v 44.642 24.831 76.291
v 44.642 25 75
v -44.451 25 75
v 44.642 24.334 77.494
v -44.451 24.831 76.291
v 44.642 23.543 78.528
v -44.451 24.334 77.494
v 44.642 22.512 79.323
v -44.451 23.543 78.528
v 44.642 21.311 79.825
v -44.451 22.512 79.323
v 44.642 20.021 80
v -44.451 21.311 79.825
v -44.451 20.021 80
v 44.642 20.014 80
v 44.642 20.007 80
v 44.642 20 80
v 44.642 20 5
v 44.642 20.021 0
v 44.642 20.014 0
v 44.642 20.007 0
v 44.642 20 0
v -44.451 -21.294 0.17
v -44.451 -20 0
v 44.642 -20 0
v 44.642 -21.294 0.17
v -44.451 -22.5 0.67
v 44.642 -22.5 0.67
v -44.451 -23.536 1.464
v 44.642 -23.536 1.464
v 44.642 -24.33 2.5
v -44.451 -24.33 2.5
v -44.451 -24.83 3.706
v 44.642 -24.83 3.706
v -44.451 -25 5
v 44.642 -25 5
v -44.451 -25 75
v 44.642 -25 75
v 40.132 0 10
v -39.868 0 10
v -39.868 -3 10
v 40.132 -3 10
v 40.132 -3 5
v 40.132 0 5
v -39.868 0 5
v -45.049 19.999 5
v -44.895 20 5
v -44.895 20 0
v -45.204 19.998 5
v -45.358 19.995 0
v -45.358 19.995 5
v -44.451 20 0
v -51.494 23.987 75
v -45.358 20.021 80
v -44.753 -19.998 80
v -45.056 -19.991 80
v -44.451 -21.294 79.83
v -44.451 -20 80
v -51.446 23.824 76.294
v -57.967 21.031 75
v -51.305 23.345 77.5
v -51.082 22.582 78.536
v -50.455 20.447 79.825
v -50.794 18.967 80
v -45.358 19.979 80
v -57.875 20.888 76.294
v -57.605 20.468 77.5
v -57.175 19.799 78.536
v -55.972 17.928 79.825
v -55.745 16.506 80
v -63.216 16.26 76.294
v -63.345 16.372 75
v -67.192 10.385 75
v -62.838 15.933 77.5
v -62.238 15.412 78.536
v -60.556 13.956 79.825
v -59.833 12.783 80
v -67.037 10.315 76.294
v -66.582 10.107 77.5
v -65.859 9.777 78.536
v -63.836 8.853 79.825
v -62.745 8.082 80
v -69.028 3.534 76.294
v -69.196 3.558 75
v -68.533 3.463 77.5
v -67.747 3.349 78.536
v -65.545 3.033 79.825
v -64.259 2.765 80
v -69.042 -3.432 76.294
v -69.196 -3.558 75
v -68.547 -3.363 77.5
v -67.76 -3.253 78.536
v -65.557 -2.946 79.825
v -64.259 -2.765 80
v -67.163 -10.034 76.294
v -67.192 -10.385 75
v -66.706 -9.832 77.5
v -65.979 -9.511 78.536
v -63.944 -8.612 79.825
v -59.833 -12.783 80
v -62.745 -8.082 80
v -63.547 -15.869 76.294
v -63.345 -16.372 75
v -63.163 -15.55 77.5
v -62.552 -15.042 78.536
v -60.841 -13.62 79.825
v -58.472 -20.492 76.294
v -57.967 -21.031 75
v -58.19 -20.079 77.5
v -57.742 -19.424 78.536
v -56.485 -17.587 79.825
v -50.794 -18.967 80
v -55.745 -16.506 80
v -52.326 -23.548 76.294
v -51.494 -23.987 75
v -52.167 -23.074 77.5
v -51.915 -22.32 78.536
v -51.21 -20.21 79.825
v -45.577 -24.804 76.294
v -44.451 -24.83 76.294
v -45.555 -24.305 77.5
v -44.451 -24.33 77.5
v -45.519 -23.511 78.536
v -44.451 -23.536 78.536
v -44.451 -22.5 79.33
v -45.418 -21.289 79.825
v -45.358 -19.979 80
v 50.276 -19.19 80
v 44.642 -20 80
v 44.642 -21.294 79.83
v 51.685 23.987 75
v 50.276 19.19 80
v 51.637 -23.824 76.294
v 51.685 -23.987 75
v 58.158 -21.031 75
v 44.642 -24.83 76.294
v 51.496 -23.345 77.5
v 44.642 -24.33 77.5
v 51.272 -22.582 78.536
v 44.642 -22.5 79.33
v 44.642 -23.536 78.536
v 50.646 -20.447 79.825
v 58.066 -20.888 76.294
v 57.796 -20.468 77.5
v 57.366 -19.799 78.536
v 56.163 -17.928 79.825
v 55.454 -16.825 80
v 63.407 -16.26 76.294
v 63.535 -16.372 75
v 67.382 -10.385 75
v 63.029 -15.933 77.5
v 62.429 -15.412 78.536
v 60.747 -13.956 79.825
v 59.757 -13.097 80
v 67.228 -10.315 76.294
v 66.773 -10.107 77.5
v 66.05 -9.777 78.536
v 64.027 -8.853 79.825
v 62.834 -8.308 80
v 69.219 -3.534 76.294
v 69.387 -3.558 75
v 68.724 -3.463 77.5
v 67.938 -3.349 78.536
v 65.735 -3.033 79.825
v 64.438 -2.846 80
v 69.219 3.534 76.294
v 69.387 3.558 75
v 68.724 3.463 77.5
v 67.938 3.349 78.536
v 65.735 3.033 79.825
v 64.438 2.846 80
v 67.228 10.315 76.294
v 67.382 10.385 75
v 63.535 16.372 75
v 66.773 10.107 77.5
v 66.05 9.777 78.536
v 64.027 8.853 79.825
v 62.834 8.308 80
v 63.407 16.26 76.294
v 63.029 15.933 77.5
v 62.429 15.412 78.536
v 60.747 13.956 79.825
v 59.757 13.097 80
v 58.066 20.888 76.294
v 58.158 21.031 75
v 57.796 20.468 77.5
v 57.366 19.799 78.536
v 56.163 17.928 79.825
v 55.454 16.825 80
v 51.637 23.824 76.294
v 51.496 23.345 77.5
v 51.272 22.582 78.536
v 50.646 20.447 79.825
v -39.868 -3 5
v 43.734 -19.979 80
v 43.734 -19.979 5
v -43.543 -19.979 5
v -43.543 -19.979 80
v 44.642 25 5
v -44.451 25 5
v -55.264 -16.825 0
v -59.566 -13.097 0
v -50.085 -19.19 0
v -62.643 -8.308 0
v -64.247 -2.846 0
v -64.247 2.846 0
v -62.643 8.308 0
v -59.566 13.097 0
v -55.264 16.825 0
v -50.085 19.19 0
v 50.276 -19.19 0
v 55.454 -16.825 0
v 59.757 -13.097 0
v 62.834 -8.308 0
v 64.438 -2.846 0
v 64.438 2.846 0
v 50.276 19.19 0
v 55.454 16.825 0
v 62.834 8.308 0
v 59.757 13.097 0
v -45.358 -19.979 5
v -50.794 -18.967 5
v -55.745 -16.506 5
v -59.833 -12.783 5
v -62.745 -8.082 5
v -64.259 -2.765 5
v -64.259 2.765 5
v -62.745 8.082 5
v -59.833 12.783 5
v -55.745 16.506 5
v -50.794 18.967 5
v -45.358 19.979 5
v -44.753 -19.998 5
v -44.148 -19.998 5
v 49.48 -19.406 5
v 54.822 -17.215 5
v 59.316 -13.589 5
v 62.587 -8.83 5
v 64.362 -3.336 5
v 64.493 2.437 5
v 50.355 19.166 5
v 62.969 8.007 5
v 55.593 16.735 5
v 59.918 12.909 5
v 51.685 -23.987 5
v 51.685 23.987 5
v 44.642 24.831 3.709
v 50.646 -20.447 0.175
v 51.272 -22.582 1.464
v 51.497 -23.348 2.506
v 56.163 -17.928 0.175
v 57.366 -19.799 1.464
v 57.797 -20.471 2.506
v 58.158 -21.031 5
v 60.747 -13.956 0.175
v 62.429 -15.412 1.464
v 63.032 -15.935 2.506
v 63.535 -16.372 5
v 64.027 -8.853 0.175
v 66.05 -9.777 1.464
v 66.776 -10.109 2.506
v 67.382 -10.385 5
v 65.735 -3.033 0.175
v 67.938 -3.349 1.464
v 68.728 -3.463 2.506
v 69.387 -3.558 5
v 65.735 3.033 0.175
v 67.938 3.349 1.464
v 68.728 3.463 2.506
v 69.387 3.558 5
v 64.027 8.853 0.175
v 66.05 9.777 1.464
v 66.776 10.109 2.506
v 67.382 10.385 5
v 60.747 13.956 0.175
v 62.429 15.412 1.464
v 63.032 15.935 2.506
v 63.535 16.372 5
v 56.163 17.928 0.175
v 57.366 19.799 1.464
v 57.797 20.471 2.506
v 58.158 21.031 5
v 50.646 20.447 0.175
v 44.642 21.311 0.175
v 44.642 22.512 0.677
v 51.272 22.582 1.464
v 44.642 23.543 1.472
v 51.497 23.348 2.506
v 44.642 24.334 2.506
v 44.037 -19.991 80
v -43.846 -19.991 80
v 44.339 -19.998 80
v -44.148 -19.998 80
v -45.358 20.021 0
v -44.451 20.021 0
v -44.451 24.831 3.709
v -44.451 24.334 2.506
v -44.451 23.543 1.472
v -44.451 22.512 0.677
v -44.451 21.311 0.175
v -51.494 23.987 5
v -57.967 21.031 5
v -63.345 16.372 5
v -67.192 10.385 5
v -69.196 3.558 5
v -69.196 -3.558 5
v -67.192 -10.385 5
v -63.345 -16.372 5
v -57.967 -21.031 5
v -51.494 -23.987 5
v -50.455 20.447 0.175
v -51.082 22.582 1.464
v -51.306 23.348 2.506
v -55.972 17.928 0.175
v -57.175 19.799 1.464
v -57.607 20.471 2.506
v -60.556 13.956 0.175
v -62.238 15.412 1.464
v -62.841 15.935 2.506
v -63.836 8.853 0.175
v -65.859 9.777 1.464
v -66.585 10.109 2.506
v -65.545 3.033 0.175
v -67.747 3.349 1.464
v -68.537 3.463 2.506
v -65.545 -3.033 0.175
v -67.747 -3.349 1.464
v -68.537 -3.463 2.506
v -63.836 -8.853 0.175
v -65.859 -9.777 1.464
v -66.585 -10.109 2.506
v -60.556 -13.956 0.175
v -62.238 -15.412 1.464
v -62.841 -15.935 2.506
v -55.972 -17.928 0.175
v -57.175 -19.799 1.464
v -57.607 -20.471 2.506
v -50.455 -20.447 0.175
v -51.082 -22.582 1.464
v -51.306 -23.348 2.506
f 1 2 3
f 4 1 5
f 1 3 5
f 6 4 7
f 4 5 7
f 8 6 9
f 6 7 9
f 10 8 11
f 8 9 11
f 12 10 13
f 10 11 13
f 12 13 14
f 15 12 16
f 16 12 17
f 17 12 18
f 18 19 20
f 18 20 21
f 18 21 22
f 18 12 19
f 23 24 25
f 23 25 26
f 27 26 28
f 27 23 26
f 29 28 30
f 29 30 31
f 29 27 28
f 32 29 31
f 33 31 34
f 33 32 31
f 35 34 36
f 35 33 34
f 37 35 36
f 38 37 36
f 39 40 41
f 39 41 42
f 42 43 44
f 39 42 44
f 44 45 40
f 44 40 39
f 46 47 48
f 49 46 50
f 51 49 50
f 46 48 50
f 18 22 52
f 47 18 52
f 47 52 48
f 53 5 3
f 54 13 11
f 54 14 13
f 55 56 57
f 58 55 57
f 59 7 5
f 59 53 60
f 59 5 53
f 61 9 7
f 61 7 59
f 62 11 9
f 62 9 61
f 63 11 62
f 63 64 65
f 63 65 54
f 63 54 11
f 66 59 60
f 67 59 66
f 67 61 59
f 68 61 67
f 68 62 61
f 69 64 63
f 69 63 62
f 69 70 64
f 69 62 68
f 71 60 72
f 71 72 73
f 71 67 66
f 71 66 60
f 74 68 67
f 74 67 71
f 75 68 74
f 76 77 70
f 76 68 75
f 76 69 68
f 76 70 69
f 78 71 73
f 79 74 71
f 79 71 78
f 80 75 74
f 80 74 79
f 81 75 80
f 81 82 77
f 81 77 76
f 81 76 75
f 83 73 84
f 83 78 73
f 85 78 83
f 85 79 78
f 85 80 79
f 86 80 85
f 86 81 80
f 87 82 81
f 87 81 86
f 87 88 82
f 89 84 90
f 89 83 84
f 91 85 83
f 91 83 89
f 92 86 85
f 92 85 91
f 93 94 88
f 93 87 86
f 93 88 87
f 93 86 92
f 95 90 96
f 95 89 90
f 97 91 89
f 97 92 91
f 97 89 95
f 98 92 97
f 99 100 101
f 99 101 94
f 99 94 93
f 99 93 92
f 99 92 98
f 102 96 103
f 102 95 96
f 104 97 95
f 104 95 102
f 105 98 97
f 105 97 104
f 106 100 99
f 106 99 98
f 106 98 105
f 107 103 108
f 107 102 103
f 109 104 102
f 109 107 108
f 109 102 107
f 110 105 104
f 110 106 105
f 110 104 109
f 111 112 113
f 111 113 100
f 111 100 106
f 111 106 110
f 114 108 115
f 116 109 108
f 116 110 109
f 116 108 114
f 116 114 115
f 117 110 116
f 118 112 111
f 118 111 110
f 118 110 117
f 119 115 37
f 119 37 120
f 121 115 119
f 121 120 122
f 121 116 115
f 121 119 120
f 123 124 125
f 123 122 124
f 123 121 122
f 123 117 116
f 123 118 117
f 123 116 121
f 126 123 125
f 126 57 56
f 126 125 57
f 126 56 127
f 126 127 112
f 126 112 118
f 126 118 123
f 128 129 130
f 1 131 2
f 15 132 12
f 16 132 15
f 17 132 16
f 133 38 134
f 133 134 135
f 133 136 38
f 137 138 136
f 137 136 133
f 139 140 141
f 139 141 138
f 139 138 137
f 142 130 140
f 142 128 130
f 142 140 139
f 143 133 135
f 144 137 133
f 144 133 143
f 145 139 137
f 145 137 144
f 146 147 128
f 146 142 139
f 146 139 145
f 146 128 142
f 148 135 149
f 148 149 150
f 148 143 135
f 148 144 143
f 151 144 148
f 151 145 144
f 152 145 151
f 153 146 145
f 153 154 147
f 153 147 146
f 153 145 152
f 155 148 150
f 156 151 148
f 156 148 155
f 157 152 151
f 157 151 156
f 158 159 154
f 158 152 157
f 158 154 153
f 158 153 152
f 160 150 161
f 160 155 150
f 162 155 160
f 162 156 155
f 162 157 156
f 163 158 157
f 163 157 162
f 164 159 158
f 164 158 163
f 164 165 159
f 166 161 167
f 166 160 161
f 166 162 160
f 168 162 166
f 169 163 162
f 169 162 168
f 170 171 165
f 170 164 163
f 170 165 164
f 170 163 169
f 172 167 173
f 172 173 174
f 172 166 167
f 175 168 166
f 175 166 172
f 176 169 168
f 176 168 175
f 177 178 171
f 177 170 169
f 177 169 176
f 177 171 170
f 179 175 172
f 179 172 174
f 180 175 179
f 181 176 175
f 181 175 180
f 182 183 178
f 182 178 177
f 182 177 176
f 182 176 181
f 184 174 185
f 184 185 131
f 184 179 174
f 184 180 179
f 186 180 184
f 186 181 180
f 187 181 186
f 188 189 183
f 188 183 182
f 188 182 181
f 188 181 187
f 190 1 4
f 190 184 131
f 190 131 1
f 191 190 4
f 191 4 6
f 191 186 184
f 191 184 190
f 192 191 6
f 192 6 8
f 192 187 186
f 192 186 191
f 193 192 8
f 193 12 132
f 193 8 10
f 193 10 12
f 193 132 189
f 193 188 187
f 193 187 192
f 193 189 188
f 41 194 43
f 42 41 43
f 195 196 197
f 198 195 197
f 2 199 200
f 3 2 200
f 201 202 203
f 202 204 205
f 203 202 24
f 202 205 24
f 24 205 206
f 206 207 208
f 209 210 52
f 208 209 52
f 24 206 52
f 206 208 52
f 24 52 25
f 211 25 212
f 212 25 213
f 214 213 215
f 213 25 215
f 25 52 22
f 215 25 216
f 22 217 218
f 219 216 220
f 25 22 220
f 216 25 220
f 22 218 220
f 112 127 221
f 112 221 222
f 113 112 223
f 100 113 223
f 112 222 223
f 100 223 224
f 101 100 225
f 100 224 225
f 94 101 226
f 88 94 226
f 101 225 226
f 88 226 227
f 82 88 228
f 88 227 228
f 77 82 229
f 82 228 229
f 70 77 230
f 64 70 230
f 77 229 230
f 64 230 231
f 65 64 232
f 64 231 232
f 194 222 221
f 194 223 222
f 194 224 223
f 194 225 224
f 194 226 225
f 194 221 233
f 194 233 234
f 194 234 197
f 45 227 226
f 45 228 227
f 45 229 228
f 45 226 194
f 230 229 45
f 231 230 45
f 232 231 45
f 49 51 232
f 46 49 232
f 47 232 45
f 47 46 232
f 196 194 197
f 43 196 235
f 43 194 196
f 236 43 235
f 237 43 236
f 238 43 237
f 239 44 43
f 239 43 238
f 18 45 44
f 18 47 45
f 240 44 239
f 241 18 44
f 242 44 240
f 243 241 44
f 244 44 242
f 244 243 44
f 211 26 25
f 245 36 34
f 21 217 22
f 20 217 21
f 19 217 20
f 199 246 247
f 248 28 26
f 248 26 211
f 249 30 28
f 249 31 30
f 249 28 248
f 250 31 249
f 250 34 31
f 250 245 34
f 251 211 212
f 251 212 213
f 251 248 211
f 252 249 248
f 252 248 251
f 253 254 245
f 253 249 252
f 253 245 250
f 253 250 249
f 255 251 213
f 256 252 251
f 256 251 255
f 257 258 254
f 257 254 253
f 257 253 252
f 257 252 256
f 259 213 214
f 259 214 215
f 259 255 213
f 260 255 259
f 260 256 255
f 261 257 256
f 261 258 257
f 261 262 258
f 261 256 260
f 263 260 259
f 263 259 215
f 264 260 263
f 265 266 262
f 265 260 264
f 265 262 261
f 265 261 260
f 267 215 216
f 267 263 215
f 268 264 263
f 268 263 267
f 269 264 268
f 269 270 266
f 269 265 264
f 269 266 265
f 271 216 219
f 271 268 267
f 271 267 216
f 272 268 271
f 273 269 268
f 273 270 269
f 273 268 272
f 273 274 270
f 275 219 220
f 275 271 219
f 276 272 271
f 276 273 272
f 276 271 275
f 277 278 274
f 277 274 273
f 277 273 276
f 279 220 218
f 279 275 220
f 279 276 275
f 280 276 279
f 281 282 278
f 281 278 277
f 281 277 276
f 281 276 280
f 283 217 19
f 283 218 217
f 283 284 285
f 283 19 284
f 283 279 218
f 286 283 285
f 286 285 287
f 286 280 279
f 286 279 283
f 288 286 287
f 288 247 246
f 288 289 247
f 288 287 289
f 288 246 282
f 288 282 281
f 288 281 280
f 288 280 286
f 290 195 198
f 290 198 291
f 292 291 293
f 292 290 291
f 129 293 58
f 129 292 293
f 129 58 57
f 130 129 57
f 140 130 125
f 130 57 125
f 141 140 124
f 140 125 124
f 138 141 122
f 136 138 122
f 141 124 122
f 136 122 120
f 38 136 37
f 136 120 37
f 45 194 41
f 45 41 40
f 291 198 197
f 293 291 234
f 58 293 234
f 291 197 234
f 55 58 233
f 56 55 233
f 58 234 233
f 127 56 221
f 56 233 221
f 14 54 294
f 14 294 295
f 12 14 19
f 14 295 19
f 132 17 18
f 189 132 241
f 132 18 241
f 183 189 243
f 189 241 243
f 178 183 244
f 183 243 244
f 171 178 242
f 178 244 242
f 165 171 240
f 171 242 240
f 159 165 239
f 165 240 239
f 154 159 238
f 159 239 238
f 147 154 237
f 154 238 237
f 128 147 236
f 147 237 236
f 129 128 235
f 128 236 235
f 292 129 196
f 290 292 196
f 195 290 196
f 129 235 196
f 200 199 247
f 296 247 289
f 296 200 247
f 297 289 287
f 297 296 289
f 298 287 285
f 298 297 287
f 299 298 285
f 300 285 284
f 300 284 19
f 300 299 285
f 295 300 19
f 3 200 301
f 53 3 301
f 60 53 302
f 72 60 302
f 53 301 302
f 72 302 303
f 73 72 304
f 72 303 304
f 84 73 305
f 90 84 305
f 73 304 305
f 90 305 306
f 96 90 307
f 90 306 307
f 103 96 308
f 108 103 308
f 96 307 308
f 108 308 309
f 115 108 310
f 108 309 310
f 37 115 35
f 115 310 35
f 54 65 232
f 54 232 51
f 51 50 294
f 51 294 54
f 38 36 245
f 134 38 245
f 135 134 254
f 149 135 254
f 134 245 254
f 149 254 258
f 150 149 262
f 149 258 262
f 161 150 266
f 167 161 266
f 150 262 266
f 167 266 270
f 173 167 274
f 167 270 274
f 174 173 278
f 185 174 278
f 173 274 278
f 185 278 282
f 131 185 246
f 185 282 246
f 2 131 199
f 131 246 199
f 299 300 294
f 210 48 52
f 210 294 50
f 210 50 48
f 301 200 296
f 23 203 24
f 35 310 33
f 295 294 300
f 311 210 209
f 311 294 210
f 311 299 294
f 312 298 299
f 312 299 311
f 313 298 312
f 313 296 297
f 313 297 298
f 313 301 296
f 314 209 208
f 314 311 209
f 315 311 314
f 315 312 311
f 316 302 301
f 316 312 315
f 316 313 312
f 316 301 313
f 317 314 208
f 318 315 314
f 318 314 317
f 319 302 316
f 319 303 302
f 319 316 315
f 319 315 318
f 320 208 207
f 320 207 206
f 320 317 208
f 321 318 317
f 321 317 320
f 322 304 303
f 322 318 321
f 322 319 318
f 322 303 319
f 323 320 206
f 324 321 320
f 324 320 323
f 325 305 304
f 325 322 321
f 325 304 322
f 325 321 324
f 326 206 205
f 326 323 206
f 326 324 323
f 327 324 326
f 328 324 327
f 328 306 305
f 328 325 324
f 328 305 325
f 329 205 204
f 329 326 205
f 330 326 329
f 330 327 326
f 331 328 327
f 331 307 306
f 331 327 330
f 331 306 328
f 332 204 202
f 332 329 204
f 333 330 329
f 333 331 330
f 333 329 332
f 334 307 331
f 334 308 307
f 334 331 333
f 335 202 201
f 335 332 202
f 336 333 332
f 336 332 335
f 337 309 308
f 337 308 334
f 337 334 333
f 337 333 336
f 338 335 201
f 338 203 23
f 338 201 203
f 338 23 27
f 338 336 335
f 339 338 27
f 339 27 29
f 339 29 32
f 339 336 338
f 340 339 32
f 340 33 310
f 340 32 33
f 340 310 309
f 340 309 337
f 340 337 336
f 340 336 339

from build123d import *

# Parameters (mm, degrees)
F2_DEPTH    = 80
F3_DEPTH    = 5
F4_W        = 80
F4_H        = 3
F5_DEPTH    = 5
F6_T1_DEPTH = 89.0924813444
F6_T4_ANGLE = 180
F6_T6_ANGLE = 180
F7_T1_DEPTH = 89.0924813444
F7_T4_ANGLE = 180
F7_T6_ANGLE = 180


# Not quite as in the source:
# - a fillet or chamfer that OpenCascade refuses, or shapes differently, is made with other operations: its cross-section is extruded or revolved along the edge and cut away or added


with BuildPart() as f2:
    # F0 (on Top) → F2 (new body)
    with BuildSketch(Plane.XY):
        with BuildLine():
            Line((44.6416767532, 25), (-44.4508045912, 25))
            ThreePointArc((-44.4508045912, 25), (-69.4508045912, 0), (-44.4508045912, -25))
            Line((-44.4508045912, -25), (44.6416767532, -25))
            ThreePointArc((44.6416767532, -25), (69.6416767532, 0), (44.6416767532, 25))
        make_face()
        with BuildLine():
            Line((-45.3583232468, 19.9793996379), (-45.3583232468, 20.0206003621))
            Line((-45.3583232468, 20.0206003621), (44.6416767532, 20.0206003621))
            Line((44.6416767532, 20.0206003621), (44.6416767532, 20))
            ThreePointArc((44.6416767532, 20), (64.6365259994, -0.4538762181), (43.7341580975, -19.9793996379))
            Line((43.7341580975, -19.9793996379), (-43.5432859355, -19.9793996379))
            ThreePointArc((-43.5432859355, -19.9793996379), (-44.4508045912, -20), (-45.3583232468, -19.9793996379))
            ThreePointArc((-45.3583232468, -19.9793996379), (-64.4508045912, 0), (-45.3583232468, 19.9793996379))
        make_face(mode=Mode.SUBTRACT)
    extrude(amount=F2_DEPTH)

    # F1 (on Top) → F3 (join)
    with BuildSketch(Plane.XY):
        with BuildLine():
            Line((45.1049394906, 20), (-44.8950605094, 20))
            ThreePointArc((-44.8950605094, 20), (-64.8950605094, 0), (-44.8950605094, -20))
            Line((-44.8950605094, -20), (-39.8680716753, -20))
            Line((-39.8680716753, -20), (40.1319283247, -20))
            Line((40.1319283247, -20), (45.1049394906, -20))
            ThreePointArc((45.1049394906, -20), (65.1049394906, 0), (45.1049394906, 20))
        make_face()
    extrude(amount=F3_DEPTH)

    # F4 (on face) → F5 (join)
    with BuildSketch(Plane.XY.offset(5)):
        with Locations((0.1319283247, -1.5)):
            Rectangle(F4_W, F4_H)
    extrude(amount=F5_DEPTH)

    # F6: fillet of radius 5 on 1 edges, made by hand

    # F6_s2 → F6_t1 (cut)
    with BuildSketch(Plane.YZ.offset(-44.4508045912)):
        with BuildLine():
            ThreePointArc((-20, 80), (-23.5355339059, 78.5355339059), (-25, 75))
            Line((-25, 75), (-25, 80))
            Line((-25, 80), (-20, 80))
        make_face()
        with BuildLine():
            ThreePointArc((25, 75), (23.5355339059, 78.5355339059), (20, 80))
            Line((20, 80), (25, 80))
            Line((25, 80), (25, 75))
        make_face()
    extrude(amount=F6_T1_DEPTH, mode=Mode.SUBTRACT)

    # F6_s3 → F6_t4 (revolve, cut)
    with BuildSketch(Plane.YZ.offset(-44.4508045912)):
        with BuildLine():
            ThreePointArc((25, 75), (23.5355339059, 78.5355339059), (20, 80))
            Line((20, 80), (25, 80))
            Line((25, 80), (25, 75))
        make_face()
    revolve(axis=Axis((-44.4508045912, 0, 80), (0, 0, 1)), revolution_arc=F6_T4_ANGLE, mode=Mode.SUBTRACT)

    # F6_s5 → F6_t6 (revolve, cut)
    with BuildSketch(Plane.YZ.offset(44.6416767532)):
        with BuildLine():
            ThreePointArc((-25, 75), (-23.5355339059, 78.5355339059), (-20, 80))
            Line((-20, 80), (-25, 80))
            Line((-25, 80), (-25, 75))
        make_face()
    revolve(axis=Axis((44.6416767532, 0, 80), (0, 0, 1)), revolution_arc=F6_T6_ANGLE, mode=Mode.SUBTRACT)

    # F7: fillet of radius 5 on 5 edges, made by hand

    # F7_s2 → F7_t1 (cut)
    with BuildSketch(Plane.YZ.offset(-44.4508045912)):
        with BuildLine():
            ThreePointArc((-20, 0), (-23.5355339059, 1.4644660941), (-25, 5))
            Line((-25, 5), (-25, 0))
            Line((-25, 0), (-20, 0))
        make_face()
        with BuildLine():
            ThreePointArc((25, 5), (23.5355339059, 1.4644660941), (20, 0))
            Line((20, 0), (25, 0))
            Line((25, 0), (25, 5))
        make_face()
    extrude(amount=F7_T1_DEPTH, mode=Mode.SUBTRACT)

    # F7_s3 → F7_t4 (revolve, cut)
    with BuildSketch(Plane.YZ.offset(-44.4508045912)):
        with BuildLine():
            ThreePointArc((20, 0), (23.5355339059, 1.4644660941), (25, 5))
            Line((25, 5), (25, 0))
            Line((25, 0), (20, 0))
        make_face()
    revolve(axis=Axis((-44.4508045912, 0, 0), (0, 0, 1)), revolution_arc=F7_T4_ANGLE, mode=Mode.SUBTRACT)

    # F7_s5 → F7_t6 (revolve, cut)
    with BuildSketch(Plane.YZ.offset(44.6416767532)):
        with BuildLine():
            ThreePointArc((-20, 0), (-23.5355339059, 1.4644660941), (-25, 5))
            Line((-25, 5), (-25, 0))
            Line((-25, 0), (-20, 0))
        make_face()
    revolve(axis=Axis((44.6416767532, 0, 0), (0, 0, 1)), revolution_arc=F7_T6_ANGLE, mode=Mode.SUBTRACT)


solid = f2.part
